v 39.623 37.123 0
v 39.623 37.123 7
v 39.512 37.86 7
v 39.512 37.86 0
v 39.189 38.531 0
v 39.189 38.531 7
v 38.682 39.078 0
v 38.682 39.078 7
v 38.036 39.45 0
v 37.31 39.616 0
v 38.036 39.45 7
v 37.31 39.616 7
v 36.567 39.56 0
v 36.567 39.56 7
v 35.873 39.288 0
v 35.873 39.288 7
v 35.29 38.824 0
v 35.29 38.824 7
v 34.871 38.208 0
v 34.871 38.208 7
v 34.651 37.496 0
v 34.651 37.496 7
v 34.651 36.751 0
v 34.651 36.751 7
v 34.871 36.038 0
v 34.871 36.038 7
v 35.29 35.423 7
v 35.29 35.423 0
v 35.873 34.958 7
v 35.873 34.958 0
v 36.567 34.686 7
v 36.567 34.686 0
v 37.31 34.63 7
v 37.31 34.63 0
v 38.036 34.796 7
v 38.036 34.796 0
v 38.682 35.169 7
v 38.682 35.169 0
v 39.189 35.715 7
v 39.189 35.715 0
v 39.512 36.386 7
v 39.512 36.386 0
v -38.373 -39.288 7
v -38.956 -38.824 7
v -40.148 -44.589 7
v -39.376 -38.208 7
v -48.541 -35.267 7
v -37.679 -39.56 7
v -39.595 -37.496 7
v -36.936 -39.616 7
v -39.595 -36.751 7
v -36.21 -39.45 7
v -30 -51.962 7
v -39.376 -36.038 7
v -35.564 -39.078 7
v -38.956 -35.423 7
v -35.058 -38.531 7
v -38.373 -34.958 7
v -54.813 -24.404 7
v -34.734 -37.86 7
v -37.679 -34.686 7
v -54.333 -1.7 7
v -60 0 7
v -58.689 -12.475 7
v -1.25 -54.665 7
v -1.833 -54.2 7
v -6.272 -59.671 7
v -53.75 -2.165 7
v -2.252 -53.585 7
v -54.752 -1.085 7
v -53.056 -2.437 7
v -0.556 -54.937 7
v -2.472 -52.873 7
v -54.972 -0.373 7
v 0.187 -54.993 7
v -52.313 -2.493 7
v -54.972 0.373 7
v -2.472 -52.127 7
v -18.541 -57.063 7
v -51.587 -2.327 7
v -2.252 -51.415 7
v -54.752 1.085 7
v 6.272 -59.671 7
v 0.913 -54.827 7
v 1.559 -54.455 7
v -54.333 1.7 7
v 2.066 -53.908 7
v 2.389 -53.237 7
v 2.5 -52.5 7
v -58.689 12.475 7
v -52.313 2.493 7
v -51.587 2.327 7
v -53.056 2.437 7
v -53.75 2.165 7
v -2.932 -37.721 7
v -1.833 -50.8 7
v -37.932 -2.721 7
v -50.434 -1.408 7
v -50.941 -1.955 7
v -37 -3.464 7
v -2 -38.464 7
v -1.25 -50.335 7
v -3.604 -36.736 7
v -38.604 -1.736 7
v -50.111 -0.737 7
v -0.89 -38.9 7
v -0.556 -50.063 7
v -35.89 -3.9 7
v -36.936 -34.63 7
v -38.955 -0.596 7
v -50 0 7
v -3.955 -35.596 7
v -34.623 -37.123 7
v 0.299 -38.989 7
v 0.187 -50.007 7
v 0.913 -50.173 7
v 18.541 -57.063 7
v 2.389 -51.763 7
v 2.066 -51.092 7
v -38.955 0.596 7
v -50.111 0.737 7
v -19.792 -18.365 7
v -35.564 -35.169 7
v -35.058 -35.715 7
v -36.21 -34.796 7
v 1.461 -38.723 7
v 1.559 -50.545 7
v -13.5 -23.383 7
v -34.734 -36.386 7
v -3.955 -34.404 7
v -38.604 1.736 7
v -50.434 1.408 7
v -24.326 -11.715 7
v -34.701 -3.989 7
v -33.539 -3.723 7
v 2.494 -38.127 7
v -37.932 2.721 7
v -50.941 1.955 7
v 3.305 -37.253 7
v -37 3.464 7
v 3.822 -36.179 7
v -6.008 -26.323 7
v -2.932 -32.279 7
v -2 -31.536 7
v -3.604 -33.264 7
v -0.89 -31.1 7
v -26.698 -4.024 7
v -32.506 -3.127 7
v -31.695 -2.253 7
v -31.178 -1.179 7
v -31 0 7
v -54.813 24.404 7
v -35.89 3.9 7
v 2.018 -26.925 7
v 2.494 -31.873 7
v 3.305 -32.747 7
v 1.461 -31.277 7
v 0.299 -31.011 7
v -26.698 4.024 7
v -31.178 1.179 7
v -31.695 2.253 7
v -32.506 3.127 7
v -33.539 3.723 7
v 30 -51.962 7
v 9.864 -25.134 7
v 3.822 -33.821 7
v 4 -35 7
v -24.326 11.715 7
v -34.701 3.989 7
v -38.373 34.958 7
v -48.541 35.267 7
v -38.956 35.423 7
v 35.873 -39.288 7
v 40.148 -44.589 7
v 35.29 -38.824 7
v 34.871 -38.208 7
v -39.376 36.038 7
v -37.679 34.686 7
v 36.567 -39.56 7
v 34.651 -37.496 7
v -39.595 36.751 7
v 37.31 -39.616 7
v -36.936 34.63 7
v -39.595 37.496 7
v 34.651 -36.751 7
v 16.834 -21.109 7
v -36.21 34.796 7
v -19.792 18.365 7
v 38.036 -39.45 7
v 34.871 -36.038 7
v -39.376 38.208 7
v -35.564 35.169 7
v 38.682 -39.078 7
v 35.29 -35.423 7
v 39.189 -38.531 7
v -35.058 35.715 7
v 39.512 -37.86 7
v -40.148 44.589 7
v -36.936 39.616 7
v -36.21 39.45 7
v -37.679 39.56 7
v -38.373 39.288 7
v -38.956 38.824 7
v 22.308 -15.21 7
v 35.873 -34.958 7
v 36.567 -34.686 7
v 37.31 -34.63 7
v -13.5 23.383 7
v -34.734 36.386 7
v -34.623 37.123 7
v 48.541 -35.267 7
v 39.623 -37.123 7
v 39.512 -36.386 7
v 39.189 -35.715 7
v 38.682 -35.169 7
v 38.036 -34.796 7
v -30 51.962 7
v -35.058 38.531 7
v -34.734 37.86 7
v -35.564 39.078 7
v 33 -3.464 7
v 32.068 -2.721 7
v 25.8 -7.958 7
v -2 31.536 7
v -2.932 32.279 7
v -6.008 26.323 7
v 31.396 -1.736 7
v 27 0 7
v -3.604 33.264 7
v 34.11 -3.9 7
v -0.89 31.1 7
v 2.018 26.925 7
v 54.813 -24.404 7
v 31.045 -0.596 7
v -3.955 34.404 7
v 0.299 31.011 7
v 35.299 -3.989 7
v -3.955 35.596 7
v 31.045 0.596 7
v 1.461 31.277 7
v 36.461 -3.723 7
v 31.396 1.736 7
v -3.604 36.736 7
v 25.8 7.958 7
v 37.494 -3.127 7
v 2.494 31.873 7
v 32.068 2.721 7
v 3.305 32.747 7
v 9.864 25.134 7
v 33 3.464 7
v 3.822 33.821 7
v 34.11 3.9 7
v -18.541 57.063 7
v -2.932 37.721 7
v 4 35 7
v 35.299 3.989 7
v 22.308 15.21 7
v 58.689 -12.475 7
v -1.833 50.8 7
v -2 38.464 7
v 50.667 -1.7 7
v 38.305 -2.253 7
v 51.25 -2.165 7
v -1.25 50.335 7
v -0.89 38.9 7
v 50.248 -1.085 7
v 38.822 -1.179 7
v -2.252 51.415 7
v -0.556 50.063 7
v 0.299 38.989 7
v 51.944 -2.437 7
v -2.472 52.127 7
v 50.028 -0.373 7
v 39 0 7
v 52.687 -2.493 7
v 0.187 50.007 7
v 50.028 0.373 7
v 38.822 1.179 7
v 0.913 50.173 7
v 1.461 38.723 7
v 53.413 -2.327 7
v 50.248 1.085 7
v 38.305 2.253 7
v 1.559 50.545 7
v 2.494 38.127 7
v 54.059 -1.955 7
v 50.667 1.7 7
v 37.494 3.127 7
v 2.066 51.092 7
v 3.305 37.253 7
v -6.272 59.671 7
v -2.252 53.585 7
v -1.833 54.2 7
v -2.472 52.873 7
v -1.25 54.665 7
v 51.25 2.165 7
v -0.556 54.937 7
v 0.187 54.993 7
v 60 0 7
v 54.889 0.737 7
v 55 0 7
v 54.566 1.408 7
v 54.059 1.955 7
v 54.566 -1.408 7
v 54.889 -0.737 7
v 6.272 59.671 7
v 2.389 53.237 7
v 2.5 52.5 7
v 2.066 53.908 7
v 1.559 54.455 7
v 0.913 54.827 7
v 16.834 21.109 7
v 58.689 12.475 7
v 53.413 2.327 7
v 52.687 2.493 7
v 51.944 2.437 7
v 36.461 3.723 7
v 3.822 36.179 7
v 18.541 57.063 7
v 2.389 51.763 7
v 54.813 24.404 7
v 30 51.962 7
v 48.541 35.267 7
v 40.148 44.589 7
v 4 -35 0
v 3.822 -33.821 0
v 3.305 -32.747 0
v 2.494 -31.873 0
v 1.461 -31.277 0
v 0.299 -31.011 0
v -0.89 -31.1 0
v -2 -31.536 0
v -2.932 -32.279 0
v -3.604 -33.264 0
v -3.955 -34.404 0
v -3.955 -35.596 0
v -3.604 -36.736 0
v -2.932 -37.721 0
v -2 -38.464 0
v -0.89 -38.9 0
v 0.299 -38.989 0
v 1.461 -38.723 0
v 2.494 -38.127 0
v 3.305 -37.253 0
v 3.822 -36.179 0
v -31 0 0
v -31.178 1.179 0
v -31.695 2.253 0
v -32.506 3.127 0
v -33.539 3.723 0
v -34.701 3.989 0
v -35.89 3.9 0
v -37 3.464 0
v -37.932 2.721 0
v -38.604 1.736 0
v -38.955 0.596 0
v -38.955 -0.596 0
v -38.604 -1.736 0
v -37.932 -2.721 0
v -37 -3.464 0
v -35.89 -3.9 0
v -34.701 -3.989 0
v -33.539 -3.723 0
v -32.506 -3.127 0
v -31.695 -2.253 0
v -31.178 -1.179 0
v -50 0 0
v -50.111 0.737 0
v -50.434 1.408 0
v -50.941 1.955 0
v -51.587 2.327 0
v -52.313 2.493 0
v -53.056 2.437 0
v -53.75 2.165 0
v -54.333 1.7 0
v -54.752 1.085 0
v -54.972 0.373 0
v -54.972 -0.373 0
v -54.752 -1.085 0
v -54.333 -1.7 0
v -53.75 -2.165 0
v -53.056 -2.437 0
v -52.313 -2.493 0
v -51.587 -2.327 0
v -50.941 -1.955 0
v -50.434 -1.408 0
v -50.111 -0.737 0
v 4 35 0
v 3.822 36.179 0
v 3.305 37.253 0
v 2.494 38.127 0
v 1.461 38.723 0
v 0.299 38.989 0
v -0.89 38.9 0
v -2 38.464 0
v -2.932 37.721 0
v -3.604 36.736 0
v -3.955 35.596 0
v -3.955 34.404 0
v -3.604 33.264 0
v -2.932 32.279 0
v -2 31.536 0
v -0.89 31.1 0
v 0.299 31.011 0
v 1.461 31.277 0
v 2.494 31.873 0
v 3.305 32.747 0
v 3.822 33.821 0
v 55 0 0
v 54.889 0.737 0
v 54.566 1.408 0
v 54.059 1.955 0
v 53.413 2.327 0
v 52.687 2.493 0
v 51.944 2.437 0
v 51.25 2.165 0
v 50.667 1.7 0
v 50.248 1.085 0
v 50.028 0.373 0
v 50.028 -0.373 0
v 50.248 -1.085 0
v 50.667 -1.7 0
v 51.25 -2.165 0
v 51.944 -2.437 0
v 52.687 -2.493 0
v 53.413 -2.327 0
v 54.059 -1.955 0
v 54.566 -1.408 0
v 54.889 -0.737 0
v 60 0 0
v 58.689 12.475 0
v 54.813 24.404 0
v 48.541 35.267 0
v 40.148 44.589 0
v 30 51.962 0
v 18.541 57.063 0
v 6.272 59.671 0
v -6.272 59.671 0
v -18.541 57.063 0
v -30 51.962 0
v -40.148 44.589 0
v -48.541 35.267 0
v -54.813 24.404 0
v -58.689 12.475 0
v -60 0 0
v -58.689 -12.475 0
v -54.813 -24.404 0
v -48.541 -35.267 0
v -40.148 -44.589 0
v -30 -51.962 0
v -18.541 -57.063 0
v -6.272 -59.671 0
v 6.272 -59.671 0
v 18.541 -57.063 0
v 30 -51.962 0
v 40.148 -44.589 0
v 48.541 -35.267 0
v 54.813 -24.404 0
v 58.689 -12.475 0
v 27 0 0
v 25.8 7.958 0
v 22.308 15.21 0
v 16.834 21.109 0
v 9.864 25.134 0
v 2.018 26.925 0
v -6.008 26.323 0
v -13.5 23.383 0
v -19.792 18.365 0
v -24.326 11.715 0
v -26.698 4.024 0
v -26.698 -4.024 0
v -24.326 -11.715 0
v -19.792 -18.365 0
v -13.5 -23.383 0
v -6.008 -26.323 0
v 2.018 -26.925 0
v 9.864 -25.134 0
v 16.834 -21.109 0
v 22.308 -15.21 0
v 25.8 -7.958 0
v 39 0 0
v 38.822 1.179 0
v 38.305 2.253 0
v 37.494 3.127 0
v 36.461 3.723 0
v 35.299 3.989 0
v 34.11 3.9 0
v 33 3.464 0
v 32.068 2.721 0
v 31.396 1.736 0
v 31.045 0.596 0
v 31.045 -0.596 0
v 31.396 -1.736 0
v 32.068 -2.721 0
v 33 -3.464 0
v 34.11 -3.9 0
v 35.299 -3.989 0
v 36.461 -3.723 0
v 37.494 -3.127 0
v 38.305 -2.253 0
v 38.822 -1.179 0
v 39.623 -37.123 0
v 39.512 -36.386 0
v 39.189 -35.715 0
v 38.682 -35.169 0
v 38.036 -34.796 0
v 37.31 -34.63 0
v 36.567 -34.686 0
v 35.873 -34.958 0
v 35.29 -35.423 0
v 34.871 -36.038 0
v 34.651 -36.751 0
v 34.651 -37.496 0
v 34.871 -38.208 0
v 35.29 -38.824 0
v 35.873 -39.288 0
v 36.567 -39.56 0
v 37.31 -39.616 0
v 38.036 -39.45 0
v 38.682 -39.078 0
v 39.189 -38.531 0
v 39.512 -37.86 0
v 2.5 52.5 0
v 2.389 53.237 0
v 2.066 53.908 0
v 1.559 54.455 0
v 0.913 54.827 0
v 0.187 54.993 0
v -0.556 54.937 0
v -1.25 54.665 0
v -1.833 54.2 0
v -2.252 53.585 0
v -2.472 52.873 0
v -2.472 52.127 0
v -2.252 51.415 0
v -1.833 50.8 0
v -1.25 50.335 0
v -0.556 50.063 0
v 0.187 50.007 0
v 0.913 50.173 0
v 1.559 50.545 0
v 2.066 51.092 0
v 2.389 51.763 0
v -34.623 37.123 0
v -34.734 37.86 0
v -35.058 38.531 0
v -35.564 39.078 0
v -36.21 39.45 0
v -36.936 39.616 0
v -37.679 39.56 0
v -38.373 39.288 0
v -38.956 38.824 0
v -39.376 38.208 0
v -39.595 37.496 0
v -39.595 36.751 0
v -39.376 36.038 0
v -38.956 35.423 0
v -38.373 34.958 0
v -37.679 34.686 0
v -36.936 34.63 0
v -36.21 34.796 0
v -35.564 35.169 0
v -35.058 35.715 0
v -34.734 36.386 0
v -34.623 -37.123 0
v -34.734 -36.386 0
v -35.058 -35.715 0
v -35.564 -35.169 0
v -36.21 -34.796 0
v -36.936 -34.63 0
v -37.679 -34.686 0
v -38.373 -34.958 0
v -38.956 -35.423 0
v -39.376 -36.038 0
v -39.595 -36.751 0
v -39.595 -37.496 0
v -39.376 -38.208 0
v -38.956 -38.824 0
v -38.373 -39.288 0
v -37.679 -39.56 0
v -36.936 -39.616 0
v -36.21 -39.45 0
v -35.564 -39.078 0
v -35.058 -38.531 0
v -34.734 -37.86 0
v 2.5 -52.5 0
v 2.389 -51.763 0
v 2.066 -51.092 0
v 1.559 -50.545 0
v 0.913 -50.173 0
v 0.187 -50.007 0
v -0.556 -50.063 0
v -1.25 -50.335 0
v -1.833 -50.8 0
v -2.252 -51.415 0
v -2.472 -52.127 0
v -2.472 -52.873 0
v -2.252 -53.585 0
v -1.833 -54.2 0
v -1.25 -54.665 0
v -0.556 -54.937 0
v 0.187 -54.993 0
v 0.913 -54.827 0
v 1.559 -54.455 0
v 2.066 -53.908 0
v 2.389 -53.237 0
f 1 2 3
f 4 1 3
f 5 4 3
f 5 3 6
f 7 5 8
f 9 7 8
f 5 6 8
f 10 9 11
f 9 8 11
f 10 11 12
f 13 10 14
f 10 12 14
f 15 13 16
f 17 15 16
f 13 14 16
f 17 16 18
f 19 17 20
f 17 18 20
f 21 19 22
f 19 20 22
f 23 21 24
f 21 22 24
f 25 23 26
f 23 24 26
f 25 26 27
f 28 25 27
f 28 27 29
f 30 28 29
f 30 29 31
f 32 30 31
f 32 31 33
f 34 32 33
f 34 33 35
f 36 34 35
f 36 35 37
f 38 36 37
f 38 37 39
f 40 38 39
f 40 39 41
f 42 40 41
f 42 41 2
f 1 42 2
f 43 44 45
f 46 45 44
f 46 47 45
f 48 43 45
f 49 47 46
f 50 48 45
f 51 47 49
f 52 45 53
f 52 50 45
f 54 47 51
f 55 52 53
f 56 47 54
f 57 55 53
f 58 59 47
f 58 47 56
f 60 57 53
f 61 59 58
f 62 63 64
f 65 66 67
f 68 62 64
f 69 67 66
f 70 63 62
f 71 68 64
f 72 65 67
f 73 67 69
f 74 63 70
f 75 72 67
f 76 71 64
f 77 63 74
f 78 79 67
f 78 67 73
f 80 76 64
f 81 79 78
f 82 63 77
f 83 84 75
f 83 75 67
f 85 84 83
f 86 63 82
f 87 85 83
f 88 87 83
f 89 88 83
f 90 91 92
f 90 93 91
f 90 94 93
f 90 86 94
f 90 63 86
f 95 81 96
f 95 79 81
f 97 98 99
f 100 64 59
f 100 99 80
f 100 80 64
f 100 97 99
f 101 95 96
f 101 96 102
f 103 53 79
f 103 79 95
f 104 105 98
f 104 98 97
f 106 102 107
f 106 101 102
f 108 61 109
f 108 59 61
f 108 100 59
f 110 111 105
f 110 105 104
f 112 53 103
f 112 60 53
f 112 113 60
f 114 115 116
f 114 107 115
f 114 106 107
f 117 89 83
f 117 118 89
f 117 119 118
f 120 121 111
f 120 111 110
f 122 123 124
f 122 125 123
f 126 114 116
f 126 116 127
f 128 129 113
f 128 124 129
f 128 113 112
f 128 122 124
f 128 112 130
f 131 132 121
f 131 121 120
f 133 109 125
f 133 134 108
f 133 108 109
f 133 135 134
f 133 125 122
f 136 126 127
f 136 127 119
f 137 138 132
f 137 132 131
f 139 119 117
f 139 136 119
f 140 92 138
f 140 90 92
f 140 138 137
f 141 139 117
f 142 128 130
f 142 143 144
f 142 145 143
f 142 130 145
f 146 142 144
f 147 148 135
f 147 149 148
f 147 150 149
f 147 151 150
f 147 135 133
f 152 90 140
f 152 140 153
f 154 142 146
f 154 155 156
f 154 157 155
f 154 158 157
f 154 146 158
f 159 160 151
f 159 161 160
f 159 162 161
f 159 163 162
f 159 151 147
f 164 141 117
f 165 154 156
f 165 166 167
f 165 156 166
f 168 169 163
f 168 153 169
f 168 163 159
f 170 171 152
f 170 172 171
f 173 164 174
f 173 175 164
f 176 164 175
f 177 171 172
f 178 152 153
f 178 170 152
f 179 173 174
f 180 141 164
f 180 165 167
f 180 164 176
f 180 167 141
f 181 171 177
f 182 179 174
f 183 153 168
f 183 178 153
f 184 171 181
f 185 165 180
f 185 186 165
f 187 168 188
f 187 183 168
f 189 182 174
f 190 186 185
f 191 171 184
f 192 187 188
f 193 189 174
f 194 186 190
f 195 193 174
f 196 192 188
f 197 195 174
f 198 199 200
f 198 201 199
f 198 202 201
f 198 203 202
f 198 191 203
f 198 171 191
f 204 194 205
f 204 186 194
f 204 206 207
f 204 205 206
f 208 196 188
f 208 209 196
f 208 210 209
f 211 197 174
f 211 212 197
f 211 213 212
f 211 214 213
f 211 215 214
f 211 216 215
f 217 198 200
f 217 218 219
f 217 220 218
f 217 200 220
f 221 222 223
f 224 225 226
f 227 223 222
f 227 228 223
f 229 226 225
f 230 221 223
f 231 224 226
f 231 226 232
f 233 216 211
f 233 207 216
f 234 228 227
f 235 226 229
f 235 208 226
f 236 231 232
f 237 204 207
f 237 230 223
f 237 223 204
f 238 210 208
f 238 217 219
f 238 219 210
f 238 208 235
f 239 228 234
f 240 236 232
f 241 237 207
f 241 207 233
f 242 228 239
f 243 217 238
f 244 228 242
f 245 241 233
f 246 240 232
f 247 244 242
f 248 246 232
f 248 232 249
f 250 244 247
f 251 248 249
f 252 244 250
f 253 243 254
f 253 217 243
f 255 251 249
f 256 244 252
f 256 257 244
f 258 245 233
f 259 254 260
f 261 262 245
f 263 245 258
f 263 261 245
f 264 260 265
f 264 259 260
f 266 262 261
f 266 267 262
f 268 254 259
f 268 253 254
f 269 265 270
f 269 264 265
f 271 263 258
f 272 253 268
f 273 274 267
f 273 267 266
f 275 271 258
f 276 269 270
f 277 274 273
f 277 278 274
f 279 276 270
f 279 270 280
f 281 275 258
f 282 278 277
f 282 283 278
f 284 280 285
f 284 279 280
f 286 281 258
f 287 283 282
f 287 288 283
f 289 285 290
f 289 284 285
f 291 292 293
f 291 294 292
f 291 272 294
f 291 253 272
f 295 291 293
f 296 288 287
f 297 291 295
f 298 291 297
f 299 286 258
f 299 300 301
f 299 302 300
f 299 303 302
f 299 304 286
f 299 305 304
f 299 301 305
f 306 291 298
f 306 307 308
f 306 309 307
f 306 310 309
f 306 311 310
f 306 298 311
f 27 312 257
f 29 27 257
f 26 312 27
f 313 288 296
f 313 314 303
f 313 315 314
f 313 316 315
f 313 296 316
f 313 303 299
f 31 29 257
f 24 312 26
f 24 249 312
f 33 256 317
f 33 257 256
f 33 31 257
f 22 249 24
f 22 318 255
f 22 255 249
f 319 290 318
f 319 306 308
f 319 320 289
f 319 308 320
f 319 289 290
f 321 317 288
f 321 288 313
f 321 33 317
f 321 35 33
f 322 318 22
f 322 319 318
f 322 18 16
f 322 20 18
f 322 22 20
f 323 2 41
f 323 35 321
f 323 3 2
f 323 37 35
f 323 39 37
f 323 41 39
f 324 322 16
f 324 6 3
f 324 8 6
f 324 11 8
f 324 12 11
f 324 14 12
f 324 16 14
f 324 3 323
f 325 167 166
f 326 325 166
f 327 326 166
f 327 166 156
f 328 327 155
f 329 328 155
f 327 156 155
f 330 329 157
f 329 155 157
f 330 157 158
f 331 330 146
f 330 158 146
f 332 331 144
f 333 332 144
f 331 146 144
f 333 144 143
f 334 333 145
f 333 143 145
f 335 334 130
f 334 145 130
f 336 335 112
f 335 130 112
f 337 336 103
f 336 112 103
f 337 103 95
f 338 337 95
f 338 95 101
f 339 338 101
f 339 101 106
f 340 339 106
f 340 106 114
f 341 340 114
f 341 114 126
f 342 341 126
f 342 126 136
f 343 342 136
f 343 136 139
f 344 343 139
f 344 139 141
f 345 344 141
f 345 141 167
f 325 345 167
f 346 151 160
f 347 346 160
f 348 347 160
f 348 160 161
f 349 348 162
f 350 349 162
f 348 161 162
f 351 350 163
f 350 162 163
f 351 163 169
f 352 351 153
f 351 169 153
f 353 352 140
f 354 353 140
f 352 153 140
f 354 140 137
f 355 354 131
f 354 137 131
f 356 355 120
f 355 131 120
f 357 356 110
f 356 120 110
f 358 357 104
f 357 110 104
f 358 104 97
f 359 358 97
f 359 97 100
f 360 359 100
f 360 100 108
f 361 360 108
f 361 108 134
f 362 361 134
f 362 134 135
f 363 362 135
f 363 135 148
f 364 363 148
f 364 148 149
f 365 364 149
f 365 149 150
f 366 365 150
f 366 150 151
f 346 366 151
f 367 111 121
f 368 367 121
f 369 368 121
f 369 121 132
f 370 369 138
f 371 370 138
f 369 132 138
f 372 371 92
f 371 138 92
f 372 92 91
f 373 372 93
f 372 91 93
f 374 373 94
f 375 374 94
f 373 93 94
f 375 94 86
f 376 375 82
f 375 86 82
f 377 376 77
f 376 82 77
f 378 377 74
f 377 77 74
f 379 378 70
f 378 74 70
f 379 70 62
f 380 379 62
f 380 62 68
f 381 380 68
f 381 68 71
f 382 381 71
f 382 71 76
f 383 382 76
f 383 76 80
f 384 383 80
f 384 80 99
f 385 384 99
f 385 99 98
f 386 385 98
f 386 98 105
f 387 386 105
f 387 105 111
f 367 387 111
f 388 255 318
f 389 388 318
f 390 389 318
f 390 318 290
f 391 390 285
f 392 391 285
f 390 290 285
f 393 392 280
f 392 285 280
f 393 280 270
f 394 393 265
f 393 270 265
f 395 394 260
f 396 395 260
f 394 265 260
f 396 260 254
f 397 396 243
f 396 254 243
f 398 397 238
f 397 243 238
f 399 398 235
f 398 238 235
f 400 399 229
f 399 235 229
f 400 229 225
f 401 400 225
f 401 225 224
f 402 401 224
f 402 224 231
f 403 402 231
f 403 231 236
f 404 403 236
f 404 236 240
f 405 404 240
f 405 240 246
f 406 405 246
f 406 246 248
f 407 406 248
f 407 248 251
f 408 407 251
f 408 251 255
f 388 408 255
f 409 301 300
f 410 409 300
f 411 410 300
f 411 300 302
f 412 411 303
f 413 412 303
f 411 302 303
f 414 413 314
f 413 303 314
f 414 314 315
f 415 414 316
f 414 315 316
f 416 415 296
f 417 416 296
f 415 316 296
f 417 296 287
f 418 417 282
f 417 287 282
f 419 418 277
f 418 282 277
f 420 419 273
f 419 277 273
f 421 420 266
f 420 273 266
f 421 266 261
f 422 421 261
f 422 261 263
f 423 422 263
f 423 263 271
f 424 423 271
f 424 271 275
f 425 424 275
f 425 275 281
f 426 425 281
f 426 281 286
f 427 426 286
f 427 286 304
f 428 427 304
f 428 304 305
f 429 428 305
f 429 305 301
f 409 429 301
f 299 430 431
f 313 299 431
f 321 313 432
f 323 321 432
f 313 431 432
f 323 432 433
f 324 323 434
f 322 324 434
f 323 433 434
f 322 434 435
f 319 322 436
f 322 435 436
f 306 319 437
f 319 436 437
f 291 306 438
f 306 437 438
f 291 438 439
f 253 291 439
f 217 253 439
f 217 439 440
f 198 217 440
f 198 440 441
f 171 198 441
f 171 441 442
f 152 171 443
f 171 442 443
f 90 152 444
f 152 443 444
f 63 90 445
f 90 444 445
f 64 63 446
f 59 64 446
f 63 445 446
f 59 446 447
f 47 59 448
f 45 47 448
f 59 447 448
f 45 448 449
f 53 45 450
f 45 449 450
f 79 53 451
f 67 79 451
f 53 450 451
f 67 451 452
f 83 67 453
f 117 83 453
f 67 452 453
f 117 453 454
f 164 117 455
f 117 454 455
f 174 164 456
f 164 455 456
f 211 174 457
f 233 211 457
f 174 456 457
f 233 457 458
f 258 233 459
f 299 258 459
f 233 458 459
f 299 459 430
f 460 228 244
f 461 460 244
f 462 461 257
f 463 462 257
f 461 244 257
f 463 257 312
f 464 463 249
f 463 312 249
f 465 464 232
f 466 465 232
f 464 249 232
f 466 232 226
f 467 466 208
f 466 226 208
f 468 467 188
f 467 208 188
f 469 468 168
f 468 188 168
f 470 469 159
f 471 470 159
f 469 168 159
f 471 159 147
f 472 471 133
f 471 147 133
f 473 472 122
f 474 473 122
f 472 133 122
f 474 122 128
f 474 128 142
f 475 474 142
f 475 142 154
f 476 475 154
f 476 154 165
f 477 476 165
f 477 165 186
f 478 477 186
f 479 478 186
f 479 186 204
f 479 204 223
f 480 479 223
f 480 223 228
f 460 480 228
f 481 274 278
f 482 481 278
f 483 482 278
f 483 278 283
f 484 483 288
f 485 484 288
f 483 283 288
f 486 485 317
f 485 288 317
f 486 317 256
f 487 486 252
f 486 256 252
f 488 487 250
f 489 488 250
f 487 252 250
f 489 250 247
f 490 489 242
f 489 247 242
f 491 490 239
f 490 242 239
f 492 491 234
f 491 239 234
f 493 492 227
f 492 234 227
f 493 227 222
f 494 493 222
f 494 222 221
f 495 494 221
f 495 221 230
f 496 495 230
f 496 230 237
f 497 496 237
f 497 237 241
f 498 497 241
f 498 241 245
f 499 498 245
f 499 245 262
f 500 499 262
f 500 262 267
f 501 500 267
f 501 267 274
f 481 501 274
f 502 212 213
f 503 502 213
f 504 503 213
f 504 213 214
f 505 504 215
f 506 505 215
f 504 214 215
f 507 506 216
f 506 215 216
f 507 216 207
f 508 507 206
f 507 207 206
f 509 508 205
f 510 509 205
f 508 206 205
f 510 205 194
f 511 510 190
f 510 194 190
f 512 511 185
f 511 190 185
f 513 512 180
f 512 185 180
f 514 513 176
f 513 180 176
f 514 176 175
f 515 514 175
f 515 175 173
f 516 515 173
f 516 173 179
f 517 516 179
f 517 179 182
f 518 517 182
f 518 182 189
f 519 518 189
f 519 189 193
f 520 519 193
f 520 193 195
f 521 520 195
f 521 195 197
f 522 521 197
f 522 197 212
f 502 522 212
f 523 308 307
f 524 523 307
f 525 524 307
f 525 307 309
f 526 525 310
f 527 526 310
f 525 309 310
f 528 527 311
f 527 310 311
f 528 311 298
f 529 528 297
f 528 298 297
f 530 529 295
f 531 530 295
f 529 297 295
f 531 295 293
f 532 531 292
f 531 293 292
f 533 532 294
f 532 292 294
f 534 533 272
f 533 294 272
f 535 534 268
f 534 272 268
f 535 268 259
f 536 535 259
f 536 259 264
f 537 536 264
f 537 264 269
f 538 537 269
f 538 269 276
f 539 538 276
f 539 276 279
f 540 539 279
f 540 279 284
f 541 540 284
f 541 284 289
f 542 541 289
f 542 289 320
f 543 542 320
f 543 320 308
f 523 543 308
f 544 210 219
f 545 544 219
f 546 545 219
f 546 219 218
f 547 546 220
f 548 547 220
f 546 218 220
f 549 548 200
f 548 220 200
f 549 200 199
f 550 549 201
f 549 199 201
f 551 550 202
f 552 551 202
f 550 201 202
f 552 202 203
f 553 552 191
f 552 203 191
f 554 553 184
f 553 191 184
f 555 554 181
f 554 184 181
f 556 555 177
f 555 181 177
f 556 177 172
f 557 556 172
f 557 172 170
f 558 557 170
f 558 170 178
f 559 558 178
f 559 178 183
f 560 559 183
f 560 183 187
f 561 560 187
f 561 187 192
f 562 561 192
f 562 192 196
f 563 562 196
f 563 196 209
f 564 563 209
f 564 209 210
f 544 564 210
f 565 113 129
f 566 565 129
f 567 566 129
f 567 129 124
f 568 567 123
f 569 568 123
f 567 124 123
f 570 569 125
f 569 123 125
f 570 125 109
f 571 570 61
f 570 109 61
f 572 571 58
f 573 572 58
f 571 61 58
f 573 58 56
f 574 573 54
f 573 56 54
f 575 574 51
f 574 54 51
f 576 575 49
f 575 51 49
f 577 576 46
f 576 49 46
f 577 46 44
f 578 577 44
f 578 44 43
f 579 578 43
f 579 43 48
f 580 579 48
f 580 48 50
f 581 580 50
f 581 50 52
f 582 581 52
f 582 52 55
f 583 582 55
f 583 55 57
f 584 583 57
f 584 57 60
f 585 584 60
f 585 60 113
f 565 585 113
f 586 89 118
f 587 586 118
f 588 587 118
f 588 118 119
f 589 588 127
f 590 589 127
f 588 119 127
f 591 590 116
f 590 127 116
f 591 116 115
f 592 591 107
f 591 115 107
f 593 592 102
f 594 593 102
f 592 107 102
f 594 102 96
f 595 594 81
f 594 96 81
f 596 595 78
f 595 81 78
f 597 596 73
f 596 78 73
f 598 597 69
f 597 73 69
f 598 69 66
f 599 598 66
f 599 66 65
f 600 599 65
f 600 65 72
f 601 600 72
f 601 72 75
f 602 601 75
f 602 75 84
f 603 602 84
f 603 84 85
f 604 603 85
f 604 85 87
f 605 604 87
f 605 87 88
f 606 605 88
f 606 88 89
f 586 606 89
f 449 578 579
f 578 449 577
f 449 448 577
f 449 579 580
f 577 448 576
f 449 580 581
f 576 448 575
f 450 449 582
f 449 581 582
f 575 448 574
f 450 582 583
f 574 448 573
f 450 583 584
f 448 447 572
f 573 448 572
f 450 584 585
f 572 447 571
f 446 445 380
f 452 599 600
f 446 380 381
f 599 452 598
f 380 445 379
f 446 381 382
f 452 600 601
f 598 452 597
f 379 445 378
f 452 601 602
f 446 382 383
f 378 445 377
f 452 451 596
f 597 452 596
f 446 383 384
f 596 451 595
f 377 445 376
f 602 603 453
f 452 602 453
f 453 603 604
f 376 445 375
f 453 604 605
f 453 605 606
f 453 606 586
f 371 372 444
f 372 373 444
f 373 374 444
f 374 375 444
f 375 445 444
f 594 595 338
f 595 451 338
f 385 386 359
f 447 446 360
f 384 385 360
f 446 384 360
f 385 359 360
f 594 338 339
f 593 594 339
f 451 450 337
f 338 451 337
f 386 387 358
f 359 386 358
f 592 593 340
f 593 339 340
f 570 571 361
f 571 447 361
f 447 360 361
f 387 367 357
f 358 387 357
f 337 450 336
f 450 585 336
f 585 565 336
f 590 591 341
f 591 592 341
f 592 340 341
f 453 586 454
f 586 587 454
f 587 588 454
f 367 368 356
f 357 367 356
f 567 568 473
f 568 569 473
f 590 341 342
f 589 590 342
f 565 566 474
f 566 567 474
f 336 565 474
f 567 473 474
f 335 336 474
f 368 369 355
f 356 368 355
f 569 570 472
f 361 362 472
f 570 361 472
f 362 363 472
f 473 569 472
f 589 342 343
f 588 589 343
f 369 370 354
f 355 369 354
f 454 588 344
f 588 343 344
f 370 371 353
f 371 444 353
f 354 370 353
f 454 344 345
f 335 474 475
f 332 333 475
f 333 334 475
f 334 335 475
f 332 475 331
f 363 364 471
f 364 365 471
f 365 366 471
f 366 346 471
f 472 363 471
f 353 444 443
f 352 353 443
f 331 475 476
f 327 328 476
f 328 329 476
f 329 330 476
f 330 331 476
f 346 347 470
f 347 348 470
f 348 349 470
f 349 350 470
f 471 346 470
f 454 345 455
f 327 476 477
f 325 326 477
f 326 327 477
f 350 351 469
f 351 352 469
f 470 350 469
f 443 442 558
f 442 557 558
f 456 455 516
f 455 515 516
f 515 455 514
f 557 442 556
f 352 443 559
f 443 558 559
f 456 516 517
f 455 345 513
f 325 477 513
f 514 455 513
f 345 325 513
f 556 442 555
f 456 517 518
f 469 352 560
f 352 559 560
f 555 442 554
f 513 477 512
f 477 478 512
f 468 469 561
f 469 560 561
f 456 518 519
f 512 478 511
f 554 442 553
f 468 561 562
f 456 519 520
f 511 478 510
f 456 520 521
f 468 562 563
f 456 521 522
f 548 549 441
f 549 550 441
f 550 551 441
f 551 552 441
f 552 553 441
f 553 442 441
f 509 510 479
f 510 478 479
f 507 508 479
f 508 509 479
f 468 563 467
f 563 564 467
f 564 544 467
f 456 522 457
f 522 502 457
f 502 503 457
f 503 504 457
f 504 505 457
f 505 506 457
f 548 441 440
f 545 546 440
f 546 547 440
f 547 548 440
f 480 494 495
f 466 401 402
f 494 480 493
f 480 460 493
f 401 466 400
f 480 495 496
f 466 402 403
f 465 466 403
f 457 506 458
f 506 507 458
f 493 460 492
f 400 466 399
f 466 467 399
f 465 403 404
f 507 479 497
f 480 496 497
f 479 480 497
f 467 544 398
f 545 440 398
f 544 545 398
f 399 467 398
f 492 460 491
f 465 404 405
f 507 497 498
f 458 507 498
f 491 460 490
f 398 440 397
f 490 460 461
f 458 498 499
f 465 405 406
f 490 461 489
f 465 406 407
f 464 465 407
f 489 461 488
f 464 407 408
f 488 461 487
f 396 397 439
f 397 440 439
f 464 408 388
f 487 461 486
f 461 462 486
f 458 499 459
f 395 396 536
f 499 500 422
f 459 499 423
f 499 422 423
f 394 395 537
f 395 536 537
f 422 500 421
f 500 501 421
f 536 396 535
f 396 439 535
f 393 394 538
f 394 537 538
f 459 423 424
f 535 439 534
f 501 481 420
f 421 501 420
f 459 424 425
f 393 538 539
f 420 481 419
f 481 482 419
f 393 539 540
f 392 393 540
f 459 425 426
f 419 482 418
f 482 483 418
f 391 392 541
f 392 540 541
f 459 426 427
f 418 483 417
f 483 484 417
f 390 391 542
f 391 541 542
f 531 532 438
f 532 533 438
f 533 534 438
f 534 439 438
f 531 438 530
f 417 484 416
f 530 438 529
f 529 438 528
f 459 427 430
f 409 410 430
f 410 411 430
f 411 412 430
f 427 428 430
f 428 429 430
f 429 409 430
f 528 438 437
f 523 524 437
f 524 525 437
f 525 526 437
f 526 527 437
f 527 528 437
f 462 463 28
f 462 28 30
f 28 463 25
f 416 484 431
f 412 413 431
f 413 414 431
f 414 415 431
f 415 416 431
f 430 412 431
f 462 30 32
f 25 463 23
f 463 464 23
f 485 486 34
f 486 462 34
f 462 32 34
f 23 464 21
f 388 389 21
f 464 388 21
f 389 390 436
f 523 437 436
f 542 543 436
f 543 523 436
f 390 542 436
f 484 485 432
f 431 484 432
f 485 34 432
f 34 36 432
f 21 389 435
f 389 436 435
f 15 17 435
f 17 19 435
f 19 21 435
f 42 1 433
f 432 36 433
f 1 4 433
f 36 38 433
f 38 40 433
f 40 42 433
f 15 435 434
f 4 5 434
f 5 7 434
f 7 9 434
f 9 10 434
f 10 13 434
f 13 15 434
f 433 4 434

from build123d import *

# Parameters (mm, degrees)
CROQUIS1_R              = 60
SALIENTE_EXTRUIR1_DEPTH = 7
CROQUIS2_R              = 27
CORTAR_EXTRUIR1_DEPTH   = 8
CROQUIS3_R              = 4
CORTAR_EXTRUIR2_DEPTH   = 8
CROQUIS5_R              = 2.5
CORTAR_EXTRUIR3_DEPTH   = 8


with BuildPart() as part:
    # Croquis1 → Saliente-Extruir1 (new body)
    with BuildSketch(Plane.XY):
        Circle(CROQUIS1_R)
    extrude(amount=SALIENTE_EXTRUIR1_DEPTH)

    # Croquis2 → Cortar-Extruir1 (cut, through all)
    with BuildSketch(Plane.XY.offset(7)):
        Circle(CROQUIS2_R)
    extrude(amount=-CORTAR_EXTRUIR1_DEPTH, mode=Mode.SUBTRACT)

    # Croquis3 → Cortar-Extruir2 (cut, through all)
    with BuildSketch(Plane.XY.offset(7)):
        with Locations((0, 35)):
            Circle(CROQUIS3_R)
        with Locations((35, 0)):
            Circle(CROQUIS3_R)
        with Locations((0, -35)):
            Circle(CROQUIS3_R)
        with Locations((-35, 0)):
            Circle(CROQUIS3_R)
    extrude(amount=-CORTAR_EXTRUIR2_DEPTH, mode=Mode.SUBTRACT)

    # Croquis5 → Cortar-Extruir3 (cut, through all)
    with BuildSketch(Plane.XY.offset(7)):
        with Locations((37.123106012, 37.123106012)):
            Circle(CROQUIS5_R)
        with Locations((52.5, 0)):
            Circle(CROQUIS5_R)
        with Locations((37.123106012, -37.123106012)):
            Circle(CROQUIS5_R)
        with Locations((-52.5, 0)):
            Circle(CROQUIS5_R)
        with Locations((-37.123106012, 37.123106012)):
            Circle(CROQUIS5_R)
        with Locations((0, 52.5)):
            Circle(CROQUIS5_R)
        with Locations((0, -52.5)):
            Circle(CROQUIS5_R)
        with Locations((-37.123106012, -37.123106012)):
            Circle(CROQUIS5_R)
    extrude(amount=-CORTAR_EXTRUIR3_DEPTH, mode=Mode.SUBTRACT)


solid = part.part
